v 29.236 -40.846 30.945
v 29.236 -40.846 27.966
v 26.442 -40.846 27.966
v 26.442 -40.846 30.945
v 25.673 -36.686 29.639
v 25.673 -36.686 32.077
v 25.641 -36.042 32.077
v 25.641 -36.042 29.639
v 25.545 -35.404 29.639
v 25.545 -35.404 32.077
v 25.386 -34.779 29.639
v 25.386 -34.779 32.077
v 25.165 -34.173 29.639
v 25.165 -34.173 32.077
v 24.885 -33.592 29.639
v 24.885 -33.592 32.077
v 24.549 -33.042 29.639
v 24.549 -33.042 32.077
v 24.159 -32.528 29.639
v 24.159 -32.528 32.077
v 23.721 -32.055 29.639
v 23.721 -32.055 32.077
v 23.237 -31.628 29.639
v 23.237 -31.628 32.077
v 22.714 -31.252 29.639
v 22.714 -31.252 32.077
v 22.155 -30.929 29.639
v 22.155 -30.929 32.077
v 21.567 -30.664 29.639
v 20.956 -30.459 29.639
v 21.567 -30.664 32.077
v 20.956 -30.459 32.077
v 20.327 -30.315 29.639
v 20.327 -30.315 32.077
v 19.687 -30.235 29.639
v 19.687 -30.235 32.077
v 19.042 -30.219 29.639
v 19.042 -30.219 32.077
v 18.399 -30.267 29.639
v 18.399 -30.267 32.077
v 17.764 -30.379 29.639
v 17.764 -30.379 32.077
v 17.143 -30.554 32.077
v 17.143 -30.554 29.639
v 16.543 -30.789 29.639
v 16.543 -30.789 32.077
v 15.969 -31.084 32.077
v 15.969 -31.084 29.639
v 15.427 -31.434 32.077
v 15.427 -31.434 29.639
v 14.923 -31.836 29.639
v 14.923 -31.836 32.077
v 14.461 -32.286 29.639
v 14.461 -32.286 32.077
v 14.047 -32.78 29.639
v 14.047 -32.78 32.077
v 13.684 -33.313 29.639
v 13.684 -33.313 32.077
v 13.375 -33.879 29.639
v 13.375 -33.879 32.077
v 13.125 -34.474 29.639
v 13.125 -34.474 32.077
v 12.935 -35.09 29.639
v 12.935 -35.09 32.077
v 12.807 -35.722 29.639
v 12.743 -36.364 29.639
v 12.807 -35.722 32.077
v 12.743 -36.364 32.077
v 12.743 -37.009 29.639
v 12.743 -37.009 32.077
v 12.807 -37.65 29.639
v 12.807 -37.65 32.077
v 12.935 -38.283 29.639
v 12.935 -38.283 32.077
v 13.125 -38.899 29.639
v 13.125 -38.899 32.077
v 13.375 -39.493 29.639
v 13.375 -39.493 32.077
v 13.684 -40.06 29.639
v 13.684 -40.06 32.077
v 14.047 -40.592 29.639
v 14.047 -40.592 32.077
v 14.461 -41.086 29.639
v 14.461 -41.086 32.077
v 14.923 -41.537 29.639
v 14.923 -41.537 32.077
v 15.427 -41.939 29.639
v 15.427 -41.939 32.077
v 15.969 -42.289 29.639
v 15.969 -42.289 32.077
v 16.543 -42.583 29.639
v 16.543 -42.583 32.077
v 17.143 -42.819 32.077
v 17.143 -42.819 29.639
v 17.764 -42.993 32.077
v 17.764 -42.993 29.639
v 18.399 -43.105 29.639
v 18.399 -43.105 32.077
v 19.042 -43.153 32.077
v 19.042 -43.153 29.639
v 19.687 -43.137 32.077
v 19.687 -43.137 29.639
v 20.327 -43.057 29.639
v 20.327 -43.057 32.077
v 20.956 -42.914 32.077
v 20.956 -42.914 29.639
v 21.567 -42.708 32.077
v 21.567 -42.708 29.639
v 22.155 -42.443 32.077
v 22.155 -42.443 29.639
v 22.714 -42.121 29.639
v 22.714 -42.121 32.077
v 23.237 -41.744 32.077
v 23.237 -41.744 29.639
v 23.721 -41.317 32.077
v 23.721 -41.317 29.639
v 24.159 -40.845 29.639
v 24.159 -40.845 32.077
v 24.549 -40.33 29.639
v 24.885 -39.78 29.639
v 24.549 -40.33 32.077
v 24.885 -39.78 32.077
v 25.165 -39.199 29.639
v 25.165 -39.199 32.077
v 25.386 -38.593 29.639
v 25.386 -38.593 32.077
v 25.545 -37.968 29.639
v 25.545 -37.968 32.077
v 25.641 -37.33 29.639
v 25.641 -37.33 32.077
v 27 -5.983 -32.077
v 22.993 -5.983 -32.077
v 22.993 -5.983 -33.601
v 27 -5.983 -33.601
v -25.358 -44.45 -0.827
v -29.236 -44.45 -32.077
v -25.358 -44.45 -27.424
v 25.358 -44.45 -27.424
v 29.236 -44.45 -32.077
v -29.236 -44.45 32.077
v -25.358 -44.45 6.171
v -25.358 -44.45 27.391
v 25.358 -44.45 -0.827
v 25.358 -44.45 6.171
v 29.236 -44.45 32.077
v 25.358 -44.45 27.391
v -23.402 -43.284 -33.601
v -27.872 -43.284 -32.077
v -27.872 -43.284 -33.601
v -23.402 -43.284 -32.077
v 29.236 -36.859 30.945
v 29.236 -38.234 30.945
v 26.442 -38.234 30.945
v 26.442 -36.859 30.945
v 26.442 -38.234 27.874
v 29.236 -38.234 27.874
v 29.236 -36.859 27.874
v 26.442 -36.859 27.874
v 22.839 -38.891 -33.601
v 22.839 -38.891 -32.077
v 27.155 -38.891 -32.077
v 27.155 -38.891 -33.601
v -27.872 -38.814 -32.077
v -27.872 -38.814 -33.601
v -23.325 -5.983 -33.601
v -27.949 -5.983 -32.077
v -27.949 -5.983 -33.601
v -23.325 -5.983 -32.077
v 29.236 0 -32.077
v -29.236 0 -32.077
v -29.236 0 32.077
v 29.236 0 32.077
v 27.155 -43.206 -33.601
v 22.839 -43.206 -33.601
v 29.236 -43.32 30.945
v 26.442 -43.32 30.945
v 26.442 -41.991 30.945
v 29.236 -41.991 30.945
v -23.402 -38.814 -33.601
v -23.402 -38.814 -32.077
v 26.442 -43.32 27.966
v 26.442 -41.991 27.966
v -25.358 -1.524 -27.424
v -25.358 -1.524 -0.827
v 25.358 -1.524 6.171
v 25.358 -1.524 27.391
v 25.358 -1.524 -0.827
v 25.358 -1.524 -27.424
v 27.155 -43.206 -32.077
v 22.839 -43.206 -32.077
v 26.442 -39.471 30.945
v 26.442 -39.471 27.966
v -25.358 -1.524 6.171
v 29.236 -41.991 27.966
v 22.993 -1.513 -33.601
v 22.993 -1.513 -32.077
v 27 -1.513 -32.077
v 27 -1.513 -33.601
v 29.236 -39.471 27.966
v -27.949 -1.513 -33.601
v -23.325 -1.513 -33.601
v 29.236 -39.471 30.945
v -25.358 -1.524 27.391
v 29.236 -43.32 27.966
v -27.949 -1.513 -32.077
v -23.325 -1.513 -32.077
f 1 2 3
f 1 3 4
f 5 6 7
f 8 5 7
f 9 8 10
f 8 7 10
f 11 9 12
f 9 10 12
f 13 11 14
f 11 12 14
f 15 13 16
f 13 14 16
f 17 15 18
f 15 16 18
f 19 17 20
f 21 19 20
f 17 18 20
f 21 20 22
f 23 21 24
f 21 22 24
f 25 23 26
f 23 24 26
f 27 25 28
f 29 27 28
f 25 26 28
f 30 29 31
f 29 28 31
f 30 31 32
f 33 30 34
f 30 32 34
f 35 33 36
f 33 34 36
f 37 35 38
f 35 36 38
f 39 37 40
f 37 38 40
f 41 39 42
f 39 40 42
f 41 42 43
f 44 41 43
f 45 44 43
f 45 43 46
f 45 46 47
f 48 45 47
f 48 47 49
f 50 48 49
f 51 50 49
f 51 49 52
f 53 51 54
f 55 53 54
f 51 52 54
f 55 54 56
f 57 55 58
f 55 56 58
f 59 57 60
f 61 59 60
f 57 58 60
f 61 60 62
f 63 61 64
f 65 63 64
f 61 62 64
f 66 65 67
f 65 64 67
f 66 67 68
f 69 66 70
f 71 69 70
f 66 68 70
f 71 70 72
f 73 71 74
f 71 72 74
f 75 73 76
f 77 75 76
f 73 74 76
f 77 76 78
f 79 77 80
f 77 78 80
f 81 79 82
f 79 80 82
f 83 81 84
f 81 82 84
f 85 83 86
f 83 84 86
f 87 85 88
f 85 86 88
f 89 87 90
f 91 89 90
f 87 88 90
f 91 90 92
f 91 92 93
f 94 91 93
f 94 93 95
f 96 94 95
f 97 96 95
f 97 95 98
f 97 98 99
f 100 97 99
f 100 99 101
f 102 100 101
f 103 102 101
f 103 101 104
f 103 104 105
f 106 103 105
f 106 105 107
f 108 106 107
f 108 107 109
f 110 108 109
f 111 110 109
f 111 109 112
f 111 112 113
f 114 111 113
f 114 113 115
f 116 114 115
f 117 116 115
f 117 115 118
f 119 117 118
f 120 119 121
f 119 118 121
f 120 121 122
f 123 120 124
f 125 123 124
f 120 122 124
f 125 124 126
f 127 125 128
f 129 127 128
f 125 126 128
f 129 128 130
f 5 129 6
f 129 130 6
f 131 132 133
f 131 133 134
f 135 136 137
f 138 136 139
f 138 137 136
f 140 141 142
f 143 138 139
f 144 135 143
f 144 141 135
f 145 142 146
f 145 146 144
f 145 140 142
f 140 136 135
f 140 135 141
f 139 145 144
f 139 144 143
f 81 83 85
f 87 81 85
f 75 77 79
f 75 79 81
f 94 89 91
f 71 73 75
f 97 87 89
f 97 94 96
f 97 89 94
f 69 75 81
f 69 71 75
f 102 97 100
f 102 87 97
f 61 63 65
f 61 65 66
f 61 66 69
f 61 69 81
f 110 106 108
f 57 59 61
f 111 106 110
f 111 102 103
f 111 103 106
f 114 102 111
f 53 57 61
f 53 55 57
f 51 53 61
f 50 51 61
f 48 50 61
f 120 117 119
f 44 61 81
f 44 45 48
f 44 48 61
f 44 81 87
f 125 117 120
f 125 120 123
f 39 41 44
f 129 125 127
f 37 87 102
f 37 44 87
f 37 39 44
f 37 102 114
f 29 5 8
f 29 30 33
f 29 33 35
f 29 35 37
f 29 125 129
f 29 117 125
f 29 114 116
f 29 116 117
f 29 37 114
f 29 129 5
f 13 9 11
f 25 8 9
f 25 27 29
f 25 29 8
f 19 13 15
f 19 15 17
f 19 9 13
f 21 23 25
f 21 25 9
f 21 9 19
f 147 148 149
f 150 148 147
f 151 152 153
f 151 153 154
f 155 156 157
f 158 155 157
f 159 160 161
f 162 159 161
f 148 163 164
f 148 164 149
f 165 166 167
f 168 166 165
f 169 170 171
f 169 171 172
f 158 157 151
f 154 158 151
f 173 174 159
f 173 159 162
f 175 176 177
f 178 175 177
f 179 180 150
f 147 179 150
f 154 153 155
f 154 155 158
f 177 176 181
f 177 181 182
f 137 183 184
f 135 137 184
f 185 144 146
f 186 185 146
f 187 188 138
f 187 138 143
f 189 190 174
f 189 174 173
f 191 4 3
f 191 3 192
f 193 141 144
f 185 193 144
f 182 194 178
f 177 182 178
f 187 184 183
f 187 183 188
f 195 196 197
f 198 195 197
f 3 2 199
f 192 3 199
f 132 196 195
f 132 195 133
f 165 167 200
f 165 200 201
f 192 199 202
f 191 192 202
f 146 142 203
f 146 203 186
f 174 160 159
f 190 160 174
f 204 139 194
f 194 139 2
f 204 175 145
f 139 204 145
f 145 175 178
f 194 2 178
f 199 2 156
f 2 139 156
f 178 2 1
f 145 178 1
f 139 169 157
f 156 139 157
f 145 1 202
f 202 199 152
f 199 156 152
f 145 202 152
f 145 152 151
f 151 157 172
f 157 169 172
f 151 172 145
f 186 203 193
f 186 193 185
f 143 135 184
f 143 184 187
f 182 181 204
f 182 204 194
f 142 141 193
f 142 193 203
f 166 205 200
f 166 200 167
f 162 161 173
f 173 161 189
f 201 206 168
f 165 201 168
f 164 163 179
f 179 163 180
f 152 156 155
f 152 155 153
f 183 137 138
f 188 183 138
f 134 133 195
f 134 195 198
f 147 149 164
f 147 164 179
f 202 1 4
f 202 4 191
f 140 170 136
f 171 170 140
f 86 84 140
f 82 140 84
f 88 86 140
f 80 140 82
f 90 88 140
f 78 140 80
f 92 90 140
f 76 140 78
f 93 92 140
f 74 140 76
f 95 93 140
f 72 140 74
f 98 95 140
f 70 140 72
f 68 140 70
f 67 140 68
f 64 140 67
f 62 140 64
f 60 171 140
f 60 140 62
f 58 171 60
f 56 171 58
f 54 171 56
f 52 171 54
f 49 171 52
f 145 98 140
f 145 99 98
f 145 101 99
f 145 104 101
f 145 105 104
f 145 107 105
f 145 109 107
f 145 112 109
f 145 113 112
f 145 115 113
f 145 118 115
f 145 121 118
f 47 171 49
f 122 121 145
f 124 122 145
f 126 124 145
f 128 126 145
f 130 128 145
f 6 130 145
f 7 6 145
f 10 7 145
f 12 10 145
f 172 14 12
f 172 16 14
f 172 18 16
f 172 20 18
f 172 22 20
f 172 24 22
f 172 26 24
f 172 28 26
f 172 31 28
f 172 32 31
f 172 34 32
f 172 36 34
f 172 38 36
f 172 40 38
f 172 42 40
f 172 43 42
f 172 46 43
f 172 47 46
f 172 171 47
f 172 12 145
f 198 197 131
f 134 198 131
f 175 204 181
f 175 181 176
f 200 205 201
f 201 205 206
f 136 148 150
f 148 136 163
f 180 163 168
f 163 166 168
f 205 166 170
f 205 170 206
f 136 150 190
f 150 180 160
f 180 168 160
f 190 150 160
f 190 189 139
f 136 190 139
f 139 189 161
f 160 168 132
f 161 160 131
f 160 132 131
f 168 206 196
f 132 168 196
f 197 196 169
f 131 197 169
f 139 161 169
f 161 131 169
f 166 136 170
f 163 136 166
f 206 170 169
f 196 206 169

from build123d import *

# Parameters (mm, degrees)
F0_W     = 58.472368
F0_H     = 64.15464
F1_DEPTH = 44.45
F2_W     = 50.716958
F2_H     = 26.597259
F2_H_2   = 21.220153
F3_DEPTH = 42.926
F4_W     = 4.469927
F4_H     = 4.469931
F4_W_2   = 4.624061
F4_H_2   = 4.46993
F4_W_3   = 4.007522
F4_W_4   = 4.31579
F4_H_3   = 4.315794
F5_DEPTH = 1.524
F6_R     = 6.469246
F7_DEPTH = 2.4384
F8_W     = 1.37474
F8_H     = 3.070258
F8_W_2   = 1.374744
F8_H_2   = 2.978608
F8_W_3   = 1.328919
F9_DEPTH = 2.794


with BuildPart() as f1:
    # F0 (on Front) → F1 (new body)
    with BuildSketch(Plane.XZ):
        Rectangle(F0_W, F0_H)
    extrude(amount=F1_DEPTH)

    # F2 (on face) → F3 (cut)
    with BuildSketch(Plane.XZ.offset(44.45)):
        with Locations((0, -14.125422)):
            Rectangle(F2_W, F2_H)
        with Locations((0, 16.780822)):
            Rectangle(F2_W, F2_H_2)
    extrude(amount=-F3_DEPTH, mode=Mode.SUBTRACT)

    # F4 (on face) → F5 (join)
    with BuildSketch(Plane(origin=(0, 0, -32.07732), x_dir=(1, 0, 0), z_dir=(0, 0, -1))):
        with Locations((-25.636799, 41.048552)):
            Rectangle(F4_W, F4_H)
        with Locations((-25.636799, 3.747775)):
            Rectangle(F4_W_2, F4_H_2)
        with Locations((24.996694, 3.747775)):
            Rectangle(F4_W_3, F4_H_2)
        with Locations((24.996694, 41.048553)):
            Rectangle(F4_W_4, F4_H_3)
    extrude(amount=F5_DEPTH)

    # F6 (on face) → F7 (cut)
    with BuildSketch(Plane.XY.offset(32.07732)):
        with Locations((19.203754, -36.686223)):
            Circle(F6_R)
    extrude(amount=-F7_DEPTH, mode=Mode.SUBTRACT)

    # F8 (on face) → F9 (cut)
    with BuildSketch(Plane.YZ.offset(29.236184)):
        with Locations((-37.546458, 29.409513)):
            Rectangle(F8_W, F8_H)
        with Locations((-40.158469, 29.455338)):
            Rectangle(F8_W_2, F8_H_2)
        with Locations((-42.655916, 29.455338)):
            Rectangle(F8_W_3, F8_H_2)
    extrude(amount=-F9_DEPTH, mode=Mode.SUBTRACT)


solid = f1.part
